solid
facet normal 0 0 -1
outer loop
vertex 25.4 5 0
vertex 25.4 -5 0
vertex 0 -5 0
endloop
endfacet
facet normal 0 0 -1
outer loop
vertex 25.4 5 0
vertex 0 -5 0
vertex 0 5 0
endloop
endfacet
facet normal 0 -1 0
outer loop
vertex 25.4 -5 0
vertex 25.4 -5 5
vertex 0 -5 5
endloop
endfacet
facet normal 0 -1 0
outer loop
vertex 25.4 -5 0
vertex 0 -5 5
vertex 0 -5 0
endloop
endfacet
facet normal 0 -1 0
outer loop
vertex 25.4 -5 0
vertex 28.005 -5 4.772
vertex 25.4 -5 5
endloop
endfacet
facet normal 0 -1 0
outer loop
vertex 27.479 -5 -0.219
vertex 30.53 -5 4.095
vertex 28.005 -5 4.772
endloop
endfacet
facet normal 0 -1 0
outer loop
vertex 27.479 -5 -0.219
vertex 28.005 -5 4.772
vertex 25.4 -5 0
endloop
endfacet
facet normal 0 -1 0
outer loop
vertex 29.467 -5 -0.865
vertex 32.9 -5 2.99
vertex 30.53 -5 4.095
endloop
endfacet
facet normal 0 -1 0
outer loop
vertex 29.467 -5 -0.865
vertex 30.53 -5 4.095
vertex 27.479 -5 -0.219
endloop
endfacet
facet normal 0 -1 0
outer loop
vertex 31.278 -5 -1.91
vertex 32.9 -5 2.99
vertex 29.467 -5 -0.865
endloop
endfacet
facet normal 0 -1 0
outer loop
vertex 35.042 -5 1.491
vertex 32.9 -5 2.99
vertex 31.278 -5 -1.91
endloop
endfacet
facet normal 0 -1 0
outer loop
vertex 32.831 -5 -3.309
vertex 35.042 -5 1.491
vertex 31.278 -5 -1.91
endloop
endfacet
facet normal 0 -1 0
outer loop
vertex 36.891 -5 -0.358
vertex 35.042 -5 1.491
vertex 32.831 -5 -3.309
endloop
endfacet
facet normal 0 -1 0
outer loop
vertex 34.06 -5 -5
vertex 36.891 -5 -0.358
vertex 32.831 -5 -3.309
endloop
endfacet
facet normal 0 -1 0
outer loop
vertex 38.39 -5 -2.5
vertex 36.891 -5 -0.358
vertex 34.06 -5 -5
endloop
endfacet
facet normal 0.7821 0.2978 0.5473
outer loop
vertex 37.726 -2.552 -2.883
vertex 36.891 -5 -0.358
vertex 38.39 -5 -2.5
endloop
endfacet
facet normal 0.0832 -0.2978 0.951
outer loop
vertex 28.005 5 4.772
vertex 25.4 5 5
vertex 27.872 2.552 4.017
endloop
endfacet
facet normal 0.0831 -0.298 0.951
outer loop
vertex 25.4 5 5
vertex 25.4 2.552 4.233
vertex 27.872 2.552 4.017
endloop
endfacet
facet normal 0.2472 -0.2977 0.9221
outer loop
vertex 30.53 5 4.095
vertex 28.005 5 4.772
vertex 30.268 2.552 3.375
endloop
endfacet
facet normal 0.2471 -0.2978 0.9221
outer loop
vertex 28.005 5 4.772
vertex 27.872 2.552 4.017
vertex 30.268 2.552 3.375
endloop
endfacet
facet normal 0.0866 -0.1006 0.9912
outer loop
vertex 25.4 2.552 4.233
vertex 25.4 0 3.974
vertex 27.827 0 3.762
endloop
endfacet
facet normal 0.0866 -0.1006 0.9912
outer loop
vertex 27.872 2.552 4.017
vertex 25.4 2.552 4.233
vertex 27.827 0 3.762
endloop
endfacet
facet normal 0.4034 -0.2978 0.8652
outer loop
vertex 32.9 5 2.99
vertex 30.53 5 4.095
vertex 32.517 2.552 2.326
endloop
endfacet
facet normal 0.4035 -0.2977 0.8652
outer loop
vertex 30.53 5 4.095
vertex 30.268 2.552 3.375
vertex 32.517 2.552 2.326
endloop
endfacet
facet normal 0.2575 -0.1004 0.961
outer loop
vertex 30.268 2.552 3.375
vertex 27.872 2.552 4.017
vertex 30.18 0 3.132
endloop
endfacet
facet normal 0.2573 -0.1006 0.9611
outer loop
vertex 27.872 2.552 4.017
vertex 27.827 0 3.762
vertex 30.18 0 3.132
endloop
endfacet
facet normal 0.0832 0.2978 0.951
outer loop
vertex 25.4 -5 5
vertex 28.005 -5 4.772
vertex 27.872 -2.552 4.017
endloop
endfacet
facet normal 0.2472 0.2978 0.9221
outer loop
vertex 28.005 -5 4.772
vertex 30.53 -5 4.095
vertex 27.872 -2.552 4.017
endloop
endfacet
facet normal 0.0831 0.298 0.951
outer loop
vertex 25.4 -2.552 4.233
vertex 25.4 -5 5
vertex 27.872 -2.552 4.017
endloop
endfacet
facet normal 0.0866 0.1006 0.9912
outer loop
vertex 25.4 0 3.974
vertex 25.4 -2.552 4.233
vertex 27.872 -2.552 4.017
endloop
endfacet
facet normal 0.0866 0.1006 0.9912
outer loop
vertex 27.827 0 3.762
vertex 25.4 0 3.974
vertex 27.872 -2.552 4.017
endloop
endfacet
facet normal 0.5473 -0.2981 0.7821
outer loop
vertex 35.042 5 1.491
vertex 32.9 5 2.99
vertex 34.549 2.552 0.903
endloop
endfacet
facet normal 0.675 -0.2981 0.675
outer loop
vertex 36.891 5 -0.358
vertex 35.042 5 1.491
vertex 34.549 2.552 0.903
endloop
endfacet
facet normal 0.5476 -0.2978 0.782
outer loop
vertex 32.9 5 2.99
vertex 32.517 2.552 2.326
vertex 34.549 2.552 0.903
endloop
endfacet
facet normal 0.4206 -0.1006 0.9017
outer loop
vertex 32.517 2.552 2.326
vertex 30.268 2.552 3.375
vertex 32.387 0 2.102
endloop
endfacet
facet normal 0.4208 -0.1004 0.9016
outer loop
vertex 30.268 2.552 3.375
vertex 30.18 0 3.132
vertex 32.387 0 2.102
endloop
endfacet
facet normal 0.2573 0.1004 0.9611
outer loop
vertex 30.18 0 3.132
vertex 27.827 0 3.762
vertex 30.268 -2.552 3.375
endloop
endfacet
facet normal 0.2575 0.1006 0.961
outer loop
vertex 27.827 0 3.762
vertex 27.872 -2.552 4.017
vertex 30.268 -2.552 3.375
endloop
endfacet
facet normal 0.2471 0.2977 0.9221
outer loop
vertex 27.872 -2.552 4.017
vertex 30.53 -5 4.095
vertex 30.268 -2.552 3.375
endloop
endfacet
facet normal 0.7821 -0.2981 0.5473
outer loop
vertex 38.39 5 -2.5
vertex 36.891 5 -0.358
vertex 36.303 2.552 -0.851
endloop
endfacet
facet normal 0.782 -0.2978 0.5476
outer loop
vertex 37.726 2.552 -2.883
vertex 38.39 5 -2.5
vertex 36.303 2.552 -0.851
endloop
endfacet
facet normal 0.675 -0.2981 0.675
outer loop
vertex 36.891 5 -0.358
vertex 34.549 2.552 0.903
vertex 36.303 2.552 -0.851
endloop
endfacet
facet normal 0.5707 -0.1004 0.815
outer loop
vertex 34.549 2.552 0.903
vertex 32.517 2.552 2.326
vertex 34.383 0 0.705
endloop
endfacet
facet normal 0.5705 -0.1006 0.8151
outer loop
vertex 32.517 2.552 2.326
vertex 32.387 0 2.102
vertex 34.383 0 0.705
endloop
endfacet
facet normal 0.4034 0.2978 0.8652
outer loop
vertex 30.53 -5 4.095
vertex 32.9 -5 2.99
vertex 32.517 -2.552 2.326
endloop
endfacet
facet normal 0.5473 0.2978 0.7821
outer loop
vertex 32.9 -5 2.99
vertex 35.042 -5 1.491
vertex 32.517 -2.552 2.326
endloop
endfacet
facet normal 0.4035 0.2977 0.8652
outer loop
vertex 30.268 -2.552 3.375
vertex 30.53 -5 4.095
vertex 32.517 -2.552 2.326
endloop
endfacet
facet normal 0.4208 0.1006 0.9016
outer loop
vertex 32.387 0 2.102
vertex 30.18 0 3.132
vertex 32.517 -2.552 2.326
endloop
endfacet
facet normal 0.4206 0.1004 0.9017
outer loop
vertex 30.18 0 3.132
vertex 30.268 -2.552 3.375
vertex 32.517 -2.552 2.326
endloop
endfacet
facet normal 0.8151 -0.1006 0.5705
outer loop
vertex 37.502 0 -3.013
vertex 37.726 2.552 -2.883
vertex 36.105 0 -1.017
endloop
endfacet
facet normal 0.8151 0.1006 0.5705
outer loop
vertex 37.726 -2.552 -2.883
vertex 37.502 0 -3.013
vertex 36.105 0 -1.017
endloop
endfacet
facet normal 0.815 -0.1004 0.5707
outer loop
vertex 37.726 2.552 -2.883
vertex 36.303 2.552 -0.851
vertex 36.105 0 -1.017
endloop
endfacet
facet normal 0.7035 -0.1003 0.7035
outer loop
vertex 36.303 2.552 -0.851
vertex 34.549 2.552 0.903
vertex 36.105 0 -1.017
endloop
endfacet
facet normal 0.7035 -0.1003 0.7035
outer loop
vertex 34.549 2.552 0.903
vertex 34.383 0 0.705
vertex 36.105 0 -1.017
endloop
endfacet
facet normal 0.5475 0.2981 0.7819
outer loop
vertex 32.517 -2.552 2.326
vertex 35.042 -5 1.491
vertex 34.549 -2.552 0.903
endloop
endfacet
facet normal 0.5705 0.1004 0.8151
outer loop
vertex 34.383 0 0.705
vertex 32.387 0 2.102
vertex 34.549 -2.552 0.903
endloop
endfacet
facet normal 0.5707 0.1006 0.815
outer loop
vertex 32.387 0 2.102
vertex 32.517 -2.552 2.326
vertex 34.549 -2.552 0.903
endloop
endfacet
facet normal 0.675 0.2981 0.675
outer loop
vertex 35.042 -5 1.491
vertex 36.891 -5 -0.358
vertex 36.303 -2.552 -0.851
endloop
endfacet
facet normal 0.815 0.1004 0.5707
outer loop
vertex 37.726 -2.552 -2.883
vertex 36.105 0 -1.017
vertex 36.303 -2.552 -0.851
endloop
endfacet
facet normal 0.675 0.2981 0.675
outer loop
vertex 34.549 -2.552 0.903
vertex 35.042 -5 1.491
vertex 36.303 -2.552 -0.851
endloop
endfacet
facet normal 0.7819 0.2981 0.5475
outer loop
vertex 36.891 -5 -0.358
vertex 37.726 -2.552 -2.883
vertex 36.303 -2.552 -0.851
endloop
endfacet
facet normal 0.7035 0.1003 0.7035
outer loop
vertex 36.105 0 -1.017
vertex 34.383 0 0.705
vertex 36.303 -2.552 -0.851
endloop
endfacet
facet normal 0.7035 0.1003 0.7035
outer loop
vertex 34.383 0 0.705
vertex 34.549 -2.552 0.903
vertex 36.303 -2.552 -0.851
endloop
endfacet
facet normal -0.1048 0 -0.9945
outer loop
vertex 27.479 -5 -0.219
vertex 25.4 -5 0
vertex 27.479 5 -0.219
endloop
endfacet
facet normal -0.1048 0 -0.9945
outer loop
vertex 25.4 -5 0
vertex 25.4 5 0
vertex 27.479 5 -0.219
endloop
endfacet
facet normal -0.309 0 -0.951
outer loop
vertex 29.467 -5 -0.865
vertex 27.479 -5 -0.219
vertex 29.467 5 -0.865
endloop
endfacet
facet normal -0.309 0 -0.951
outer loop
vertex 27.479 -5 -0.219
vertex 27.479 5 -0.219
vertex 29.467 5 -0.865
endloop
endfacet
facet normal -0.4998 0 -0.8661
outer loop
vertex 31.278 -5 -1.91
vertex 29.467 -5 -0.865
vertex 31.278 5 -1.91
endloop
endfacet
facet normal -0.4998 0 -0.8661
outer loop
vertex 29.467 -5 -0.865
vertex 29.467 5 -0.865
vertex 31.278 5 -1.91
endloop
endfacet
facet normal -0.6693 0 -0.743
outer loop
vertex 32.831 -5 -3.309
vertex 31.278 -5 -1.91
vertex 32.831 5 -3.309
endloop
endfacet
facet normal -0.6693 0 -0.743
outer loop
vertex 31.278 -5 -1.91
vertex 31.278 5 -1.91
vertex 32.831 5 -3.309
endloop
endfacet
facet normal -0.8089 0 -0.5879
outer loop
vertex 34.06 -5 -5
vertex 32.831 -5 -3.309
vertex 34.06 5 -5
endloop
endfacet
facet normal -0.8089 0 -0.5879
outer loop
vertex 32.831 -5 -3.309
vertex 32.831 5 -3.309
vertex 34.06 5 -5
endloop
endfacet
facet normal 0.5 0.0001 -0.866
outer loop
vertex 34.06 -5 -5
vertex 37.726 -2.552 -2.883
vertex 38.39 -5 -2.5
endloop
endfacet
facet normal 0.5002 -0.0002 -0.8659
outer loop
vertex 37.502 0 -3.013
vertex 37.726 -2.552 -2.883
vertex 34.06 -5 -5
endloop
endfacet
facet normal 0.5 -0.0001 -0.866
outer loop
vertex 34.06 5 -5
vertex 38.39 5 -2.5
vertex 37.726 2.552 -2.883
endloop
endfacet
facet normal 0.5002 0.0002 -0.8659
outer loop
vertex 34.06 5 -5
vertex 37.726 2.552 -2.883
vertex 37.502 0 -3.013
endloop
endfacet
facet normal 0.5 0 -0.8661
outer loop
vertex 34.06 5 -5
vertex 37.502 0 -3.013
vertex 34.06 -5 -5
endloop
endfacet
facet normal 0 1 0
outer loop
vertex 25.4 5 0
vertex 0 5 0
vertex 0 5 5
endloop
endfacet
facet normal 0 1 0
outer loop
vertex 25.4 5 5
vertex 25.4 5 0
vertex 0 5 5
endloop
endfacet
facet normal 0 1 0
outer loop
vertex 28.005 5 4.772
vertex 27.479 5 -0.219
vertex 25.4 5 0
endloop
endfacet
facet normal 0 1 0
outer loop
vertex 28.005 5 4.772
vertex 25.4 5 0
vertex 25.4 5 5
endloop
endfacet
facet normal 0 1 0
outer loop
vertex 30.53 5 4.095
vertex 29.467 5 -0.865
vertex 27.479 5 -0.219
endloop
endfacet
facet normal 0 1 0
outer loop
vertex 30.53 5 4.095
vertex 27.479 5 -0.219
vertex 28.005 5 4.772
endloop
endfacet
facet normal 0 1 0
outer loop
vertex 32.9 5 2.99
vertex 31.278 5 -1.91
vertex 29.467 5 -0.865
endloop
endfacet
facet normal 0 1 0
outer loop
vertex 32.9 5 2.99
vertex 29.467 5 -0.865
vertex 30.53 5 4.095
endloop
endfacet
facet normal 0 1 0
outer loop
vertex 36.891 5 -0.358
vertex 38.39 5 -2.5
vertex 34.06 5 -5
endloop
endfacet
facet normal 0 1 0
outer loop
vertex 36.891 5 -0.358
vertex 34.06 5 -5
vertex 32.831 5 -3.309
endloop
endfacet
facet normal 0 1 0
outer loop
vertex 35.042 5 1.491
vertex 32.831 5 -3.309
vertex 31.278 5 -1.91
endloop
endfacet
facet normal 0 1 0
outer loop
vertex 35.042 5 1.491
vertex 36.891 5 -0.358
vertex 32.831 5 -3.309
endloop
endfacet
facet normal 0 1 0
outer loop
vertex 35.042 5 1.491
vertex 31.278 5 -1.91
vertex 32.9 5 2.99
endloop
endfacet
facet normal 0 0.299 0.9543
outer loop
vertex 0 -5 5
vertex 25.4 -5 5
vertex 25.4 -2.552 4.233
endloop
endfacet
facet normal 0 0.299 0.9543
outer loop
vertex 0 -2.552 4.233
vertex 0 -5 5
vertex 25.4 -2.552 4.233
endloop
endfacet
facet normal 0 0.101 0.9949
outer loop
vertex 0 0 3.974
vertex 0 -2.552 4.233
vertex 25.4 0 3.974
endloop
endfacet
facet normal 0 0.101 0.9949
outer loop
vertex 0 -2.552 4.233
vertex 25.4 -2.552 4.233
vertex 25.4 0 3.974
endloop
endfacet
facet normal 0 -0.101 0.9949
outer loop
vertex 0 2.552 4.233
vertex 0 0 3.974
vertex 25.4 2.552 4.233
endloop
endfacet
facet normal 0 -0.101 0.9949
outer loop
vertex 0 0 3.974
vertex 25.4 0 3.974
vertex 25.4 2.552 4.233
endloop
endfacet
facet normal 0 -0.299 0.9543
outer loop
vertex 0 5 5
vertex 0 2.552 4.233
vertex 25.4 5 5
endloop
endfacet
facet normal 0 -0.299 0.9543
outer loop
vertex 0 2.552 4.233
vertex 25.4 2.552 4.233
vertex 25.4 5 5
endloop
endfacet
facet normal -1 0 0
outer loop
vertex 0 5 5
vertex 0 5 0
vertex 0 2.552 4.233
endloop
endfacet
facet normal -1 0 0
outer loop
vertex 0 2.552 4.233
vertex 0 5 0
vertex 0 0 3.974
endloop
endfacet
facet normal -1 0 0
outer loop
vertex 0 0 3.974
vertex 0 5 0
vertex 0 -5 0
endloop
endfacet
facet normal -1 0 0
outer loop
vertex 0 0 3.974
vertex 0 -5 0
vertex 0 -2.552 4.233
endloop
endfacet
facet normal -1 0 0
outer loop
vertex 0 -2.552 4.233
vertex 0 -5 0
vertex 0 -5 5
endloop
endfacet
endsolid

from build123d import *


with BuildPart() as part:
    # Sweep1: sweep along a path in Sketch1
    with BuildLine(Plane(origin=(0, 0, 0), x_dir=(1, 0, 0), z_dir=(0, 1, 0))) as sweep1_path:
        Line((0, 0), (25.4, 0))
        ThreePointArc((25.4, 0), (30.4, 1.339745962), (34.060254038, 5))
    # Sketch2 → Sweep1 (sweep)
    with BuildSketch(Plane(origin=(0, 0, 0), x_dir=(0, 0, -1), z_dir=(1, 0, 0))):
        with BuildLine():
            Line((0, 5), (0, -5))
            Line((0, -5), (-5, -5))
            ThreePointArc((-5, -5), (-3.974330816, 0), (-5, 5))
            Line((-5, 5), (0, 5))
        make_face()
    sweep(path=sweep1_path.line)


solid = part.part
